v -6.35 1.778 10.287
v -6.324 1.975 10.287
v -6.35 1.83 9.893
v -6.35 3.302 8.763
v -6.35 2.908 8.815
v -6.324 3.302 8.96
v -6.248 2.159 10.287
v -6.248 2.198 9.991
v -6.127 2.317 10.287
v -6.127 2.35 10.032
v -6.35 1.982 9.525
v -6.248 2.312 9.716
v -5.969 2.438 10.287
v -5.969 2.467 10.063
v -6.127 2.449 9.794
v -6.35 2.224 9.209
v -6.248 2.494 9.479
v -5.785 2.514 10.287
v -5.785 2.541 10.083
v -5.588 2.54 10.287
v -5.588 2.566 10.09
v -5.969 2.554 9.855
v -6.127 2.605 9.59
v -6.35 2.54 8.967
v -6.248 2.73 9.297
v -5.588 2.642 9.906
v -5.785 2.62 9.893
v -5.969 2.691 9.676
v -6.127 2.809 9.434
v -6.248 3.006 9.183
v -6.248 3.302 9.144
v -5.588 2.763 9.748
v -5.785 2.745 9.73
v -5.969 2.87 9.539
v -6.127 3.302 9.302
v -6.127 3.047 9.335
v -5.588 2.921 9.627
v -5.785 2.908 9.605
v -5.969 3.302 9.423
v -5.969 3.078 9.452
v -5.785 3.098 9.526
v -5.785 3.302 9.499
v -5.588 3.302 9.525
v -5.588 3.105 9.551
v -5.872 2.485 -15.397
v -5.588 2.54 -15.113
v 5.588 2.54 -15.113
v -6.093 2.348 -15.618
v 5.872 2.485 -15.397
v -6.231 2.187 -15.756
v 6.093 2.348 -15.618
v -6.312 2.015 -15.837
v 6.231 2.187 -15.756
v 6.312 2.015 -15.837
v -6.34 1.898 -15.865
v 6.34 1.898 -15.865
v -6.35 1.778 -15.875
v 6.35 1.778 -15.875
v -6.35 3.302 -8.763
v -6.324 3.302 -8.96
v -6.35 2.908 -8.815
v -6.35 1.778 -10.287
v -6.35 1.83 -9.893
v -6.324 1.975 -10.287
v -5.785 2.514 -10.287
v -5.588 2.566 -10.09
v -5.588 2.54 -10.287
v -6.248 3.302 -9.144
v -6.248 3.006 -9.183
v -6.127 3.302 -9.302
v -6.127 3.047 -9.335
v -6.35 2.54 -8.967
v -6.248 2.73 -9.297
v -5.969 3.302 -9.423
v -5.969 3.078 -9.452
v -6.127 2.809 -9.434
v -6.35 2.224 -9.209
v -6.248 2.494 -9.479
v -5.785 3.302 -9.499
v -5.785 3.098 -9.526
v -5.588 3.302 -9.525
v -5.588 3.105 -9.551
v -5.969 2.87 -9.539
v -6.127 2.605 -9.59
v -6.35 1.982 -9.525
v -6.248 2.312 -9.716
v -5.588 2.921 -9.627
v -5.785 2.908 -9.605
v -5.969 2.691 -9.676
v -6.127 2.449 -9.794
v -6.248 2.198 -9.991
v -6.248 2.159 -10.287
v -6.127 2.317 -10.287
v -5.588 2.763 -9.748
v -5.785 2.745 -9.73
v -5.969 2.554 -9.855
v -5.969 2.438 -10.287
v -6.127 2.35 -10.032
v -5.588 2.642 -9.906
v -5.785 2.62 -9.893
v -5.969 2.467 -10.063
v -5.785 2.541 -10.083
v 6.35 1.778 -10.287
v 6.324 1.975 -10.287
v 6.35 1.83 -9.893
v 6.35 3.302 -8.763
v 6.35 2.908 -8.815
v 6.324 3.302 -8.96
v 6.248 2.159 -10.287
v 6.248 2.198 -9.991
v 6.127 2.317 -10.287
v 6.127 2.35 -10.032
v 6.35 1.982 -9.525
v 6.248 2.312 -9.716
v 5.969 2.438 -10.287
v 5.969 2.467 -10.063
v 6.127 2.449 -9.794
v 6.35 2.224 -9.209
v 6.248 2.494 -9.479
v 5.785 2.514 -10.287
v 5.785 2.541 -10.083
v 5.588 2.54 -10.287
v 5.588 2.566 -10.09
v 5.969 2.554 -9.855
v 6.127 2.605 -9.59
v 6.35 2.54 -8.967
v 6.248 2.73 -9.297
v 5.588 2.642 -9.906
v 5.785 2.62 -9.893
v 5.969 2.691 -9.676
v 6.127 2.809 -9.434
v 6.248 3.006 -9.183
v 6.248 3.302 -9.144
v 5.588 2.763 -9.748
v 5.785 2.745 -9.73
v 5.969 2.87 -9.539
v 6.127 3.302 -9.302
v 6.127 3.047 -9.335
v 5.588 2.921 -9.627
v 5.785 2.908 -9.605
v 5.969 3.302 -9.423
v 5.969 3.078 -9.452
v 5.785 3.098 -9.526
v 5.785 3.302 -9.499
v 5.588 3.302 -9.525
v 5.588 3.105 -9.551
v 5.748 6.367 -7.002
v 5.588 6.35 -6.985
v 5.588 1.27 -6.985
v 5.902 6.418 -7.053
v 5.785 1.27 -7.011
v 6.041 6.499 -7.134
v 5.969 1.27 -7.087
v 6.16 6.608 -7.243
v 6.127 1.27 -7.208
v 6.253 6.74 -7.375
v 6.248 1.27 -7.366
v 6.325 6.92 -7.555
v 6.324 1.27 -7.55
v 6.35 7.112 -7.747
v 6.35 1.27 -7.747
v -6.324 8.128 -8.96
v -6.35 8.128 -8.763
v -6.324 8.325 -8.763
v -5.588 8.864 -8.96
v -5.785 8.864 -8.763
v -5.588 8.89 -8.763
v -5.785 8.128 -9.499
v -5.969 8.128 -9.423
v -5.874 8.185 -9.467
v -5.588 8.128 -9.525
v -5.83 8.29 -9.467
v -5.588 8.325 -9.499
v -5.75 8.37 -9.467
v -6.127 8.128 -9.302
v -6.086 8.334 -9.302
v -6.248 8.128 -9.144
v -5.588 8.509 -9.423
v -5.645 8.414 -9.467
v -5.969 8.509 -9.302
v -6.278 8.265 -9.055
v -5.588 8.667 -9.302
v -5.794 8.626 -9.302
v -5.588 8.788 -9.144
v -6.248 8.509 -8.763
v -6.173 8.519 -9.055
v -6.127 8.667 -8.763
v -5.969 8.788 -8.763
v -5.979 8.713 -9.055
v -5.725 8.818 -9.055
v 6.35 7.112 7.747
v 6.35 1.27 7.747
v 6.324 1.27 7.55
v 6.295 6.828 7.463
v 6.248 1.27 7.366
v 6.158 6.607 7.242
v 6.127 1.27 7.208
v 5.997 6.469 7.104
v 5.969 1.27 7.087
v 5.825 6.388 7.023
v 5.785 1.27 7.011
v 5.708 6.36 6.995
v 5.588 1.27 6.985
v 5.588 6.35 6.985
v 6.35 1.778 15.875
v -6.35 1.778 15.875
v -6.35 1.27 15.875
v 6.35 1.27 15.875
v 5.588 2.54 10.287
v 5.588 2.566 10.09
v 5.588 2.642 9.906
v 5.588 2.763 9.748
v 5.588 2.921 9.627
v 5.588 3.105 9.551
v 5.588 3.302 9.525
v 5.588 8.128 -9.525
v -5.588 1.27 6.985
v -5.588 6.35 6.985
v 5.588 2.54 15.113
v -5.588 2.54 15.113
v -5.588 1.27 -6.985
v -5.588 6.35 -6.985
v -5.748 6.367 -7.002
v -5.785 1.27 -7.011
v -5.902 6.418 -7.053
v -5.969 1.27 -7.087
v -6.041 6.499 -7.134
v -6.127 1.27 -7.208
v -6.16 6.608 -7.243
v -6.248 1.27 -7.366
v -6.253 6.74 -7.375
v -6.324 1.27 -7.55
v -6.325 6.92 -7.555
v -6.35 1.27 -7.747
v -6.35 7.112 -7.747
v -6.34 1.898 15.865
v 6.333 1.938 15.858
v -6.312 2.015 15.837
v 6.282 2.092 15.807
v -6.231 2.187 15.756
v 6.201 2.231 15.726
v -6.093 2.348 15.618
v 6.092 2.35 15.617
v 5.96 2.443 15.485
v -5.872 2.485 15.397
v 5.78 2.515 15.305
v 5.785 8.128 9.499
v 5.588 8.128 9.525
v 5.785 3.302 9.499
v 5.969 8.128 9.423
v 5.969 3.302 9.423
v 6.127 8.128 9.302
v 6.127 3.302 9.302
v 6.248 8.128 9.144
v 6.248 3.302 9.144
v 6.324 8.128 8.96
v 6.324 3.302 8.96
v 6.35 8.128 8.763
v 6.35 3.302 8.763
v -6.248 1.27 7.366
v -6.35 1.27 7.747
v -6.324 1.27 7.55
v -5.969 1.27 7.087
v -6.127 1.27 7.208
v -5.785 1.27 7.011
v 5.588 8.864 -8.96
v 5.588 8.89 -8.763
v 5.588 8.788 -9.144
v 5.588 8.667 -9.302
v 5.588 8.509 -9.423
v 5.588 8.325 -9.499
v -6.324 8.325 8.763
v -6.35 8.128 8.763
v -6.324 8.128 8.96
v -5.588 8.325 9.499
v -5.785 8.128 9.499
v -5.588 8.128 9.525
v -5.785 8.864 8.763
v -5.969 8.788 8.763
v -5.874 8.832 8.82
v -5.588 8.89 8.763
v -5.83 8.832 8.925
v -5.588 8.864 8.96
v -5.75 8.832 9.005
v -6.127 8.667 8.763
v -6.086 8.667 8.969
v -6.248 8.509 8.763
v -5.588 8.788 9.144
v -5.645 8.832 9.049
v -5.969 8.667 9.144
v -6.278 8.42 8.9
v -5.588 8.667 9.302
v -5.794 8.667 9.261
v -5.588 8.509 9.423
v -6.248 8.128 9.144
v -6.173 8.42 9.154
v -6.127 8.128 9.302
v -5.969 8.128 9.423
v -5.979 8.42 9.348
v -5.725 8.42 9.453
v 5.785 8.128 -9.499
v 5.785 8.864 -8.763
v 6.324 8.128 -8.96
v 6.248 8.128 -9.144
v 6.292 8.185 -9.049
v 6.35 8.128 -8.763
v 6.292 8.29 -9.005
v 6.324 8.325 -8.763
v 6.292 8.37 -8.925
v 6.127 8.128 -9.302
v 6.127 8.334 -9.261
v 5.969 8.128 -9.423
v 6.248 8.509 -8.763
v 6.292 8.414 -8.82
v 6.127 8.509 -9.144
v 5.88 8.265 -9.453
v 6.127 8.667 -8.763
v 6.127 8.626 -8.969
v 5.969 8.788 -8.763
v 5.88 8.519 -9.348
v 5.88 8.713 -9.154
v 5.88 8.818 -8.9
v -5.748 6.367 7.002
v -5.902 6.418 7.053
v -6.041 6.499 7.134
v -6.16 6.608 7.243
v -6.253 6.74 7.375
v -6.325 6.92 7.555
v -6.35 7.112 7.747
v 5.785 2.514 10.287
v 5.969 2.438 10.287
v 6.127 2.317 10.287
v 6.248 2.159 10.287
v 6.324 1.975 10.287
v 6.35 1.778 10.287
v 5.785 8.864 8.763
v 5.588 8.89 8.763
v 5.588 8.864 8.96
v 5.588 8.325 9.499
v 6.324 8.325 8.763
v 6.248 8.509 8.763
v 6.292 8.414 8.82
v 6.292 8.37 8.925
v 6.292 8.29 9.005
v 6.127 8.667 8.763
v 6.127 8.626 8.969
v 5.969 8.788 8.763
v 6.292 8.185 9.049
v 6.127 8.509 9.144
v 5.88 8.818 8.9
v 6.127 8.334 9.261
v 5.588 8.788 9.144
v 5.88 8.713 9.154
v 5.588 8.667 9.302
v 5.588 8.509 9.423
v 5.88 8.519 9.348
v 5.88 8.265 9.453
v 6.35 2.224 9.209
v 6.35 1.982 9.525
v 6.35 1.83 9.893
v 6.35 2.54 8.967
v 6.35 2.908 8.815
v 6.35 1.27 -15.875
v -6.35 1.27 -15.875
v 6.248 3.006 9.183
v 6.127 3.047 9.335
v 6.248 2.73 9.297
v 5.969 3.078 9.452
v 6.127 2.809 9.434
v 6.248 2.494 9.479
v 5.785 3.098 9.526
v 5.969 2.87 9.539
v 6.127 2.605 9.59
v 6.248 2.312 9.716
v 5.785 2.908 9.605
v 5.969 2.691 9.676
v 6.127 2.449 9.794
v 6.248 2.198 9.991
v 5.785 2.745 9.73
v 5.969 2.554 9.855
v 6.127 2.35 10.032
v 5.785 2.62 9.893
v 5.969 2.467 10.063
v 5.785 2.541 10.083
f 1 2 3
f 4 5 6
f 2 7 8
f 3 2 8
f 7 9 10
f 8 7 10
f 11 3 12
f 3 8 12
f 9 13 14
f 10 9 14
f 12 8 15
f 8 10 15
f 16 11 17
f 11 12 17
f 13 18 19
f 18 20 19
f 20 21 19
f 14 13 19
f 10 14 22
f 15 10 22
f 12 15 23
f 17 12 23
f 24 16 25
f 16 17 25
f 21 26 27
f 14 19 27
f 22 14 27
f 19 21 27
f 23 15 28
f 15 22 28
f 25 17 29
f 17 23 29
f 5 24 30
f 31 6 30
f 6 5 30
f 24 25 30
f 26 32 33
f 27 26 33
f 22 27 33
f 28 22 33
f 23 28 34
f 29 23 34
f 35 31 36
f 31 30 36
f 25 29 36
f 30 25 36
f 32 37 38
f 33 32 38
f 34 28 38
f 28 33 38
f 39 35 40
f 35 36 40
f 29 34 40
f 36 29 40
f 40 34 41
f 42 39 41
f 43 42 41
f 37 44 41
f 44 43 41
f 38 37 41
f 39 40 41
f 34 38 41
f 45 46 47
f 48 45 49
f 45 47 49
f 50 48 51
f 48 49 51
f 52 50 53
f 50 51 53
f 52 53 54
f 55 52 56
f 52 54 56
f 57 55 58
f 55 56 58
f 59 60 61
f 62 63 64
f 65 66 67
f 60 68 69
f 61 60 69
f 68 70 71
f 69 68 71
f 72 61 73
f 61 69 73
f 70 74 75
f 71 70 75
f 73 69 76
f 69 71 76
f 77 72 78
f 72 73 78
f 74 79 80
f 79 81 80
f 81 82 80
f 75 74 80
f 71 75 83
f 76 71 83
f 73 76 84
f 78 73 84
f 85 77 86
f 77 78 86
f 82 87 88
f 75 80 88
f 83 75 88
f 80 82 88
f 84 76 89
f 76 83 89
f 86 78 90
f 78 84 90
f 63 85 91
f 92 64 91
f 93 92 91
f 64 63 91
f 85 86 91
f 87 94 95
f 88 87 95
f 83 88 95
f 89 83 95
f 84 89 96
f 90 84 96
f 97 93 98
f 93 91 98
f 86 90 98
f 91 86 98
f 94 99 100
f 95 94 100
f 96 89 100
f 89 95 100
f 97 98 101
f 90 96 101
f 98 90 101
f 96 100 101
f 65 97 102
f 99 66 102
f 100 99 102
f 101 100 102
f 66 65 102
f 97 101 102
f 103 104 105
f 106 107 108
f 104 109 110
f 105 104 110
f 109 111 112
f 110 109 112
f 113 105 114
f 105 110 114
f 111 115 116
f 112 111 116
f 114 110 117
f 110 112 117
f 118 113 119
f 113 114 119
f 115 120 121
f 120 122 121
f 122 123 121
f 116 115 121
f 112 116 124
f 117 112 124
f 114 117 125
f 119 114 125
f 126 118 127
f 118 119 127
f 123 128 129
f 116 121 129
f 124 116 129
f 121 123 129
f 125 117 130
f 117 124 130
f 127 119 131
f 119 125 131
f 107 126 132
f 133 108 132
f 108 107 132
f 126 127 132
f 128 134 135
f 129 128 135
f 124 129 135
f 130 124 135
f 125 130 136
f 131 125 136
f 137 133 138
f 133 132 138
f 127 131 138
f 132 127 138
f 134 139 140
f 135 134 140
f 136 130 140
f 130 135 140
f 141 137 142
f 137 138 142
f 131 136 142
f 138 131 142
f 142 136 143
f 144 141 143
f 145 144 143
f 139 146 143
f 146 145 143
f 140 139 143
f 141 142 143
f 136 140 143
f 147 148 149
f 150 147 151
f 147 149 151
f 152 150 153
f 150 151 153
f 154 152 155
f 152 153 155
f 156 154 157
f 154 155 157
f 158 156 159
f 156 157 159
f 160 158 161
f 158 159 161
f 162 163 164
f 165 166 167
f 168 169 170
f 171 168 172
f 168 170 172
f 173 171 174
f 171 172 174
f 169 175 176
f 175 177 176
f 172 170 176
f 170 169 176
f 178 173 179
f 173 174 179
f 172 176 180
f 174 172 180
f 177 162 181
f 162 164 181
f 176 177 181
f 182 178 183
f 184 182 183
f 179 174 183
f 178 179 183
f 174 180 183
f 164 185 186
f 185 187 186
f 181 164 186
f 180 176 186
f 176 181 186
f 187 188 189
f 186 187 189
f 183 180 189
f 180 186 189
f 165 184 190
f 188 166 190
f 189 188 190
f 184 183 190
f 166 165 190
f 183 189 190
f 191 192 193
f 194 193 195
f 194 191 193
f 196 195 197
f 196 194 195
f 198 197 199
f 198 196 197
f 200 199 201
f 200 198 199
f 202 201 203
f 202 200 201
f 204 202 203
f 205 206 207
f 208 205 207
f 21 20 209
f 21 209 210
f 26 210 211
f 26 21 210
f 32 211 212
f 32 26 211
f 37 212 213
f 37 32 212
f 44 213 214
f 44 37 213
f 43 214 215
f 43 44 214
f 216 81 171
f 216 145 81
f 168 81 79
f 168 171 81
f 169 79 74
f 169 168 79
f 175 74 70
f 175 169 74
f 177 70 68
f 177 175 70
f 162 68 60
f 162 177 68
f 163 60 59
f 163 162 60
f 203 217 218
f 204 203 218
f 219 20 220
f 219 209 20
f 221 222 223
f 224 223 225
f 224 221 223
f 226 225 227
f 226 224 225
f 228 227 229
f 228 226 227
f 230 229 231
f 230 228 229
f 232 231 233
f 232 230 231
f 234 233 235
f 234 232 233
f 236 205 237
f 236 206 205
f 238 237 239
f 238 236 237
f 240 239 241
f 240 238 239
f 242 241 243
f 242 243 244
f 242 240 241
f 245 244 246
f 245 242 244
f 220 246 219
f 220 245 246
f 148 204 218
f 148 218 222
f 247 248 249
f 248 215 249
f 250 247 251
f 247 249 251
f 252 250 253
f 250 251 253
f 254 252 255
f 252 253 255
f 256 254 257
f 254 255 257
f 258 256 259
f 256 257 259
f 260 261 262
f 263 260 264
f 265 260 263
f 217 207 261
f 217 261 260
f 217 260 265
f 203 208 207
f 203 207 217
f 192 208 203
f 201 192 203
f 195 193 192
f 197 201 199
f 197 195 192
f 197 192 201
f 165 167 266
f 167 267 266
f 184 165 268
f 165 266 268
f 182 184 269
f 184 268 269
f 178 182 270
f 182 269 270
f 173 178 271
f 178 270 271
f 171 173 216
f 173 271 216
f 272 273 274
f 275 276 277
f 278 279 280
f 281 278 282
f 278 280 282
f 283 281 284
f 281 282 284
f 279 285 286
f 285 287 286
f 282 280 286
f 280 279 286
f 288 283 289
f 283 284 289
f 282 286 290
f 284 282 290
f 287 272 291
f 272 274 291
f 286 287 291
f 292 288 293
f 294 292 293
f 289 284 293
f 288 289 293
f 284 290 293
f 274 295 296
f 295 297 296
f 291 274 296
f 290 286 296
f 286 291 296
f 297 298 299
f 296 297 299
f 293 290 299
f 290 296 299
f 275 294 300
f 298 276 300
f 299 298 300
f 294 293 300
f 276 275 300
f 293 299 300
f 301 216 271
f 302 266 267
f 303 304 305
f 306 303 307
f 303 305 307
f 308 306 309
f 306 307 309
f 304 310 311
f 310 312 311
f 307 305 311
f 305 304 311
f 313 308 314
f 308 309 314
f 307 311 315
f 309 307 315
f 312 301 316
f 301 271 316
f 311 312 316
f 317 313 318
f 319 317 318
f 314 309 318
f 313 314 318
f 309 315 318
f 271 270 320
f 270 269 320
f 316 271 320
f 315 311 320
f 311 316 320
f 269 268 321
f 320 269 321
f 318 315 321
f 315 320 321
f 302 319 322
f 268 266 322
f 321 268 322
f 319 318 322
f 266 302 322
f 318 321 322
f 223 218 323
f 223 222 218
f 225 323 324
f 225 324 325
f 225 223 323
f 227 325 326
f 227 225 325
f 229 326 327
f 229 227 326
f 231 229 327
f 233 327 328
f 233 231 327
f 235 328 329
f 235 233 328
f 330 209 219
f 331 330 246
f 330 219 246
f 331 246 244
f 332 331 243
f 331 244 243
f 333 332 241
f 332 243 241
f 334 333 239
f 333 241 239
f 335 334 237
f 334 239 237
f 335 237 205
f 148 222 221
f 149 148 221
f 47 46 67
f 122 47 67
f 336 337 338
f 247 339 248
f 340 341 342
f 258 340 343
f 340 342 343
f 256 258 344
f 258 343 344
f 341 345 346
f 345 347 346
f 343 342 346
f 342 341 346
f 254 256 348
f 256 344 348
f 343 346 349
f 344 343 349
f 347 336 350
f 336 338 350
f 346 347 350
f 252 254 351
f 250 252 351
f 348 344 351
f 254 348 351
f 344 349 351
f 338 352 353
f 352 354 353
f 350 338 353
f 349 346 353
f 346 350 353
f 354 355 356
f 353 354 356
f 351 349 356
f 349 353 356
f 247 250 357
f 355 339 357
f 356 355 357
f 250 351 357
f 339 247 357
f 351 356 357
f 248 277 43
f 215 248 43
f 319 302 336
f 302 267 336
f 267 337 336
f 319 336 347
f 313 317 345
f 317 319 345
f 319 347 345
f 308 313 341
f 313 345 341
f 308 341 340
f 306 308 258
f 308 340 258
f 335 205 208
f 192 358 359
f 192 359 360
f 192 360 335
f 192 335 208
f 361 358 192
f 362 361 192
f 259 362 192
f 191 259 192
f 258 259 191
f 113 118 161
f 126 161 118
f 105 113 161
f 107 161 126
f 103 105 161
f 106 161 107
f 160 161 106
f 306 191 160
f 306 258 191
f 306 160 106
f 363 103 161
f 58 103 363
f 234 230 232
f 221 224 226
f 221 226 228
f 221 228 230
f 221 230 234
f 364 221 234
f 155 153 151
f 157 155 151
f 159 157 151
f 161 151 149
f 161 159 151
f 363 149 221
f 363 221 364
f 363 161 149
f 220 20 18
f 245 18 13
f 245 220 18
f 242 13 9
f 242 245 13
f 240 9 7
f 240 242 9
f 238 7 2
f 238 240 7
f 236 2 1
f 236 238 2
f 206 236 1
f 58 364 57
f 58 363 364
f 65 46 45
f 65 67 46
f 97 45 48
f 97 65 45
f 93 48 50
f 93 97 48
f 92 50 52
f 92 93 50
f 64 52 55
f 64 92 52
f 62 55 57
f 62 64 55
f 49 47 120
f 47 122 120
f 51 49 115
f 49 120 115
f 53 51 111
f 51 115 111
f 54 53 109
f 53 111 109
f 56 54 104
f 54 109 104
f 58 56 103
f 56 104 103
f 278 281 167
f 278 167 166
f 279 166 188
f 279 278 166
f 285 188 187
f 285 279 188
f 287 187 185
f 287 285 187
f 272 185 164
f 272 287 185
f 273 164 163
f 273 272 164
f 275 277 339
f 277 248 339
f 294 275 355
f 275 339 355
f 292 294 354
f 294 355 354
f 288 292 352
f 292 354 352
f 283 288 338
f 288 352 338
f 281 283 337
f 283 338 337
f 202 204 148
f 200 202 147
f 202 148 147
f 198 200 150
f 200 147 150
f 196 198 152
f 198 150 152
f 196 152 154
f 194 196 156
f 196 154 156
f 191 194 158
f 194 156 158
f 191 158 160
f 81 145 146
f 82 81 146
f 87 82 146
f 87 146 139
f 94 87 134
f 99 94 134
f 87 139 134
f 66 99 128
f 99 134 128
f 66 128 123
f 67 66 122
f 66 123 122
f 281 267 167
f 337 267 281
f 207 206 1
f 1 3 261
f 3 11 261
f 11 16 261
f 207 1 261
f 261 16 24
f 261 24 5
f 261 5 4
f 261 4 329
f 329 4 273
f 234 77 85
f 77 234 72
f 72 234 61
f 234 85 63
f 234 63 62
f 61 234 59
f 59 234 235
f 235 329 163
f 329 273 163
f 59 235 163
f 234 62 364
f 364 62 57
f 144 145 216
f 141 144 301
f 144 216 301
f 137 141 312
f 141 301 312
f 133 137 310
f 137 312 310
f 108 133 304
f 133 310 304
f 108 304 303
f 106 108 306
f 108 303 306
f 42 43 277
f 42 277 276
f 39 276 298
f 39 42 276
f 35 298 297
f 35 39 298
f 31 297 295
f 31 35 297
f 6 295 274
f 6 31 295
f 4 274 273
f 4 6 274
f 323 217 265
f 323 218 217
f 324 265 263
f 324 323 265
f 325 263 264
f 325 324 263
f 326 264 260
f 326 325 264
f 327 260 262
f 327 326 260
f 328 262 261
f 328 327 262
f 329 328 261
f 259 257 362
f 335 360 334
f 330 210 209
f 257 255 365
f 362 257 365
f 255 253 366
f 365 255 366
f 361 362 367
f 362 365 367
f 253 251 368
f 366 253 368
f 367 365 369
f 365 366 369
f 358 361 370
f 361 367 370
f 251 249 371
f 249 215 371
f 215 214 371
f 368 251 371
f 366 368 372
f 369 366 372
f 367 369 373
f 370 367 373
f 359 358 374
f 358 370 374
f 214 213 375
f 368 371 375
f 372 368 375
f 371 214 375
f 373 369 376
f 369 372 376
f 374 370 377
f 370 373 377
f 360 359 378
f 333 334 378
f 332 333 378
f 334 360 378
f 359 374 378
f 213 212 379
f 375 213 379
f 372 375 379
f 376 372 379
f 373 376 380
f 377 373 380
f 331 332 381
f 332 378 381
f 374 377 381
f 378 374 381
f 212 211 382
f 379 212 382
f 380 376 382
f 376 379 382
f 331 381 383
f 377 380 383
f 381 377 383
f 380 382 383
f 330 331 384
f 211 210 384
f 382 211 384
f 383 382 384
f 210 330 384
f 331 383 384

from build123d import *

# Parameters (mm, degrees)
BOSS_EXTRUDE1_DEPTH = 6.35
FILLET1_R           = 0.762


with BuildPart() as part:
    # Sketch2 → Boss-Extrude1 (new, symmetric)
    with BuildSketch(Plane(origin=(0, 0, 0), x_dir=(0, 0, -1), z_dir=(1, 0, 0))):
        Polygon((-15.875, 1.27), (-6.985, 1.27), (-6.985, 6.35), (6.985, 6.35), (6.985, 1.27), (15.875, 1.27), (15.875, 2.54), (9.525, 2.54), (9.525, 8.89), (-9.525, 8.89), (-9.525, 2.54), (-15.875, 2.54), align=None)
    extrude(amount=BOSS_EXTRUDE1_DEPTH, both=True)

    # Fillet1
    fillet1_edges = [part.edges().sort_by_distance(p)[0] for p in [
        (-6.35, 2.54, 12.7),
        (-6.35, 5.715, 9.525),
        (6.35, 3.81, 6.985),
        (-6.35, 8.89, 0),
        (-6.35, 5.715, -9.525),
        (-6.35, 2.54, -12.7),
        (-6.35, 3.81, -6.985),
        (-6.35, 6.35, 0),
        (-6.35, 3.81, 6.985),
        (6.35, 6.35, 0),
        (0, 2.54, 15.875),
        (0, 2.54, 9.525),
        (0, 8.89, 9.525),
        (6.35, 3.81, -6.985),
        (0, 8.89, -9.525),
        (0, 2.54, -9.525),
        (0, 2.54, -15.875),
        (6.35, 2.54, -12.7),
        (6.35, 5.715, -9.525),
        (6.35, 8.89, 0),
        (6.35, 5.715, 9.525),
        (6.35, 2.54, 12.7),
    ]]
    fillet(fillet1_edges, radius=FILLET1_R)


solid = part.part
